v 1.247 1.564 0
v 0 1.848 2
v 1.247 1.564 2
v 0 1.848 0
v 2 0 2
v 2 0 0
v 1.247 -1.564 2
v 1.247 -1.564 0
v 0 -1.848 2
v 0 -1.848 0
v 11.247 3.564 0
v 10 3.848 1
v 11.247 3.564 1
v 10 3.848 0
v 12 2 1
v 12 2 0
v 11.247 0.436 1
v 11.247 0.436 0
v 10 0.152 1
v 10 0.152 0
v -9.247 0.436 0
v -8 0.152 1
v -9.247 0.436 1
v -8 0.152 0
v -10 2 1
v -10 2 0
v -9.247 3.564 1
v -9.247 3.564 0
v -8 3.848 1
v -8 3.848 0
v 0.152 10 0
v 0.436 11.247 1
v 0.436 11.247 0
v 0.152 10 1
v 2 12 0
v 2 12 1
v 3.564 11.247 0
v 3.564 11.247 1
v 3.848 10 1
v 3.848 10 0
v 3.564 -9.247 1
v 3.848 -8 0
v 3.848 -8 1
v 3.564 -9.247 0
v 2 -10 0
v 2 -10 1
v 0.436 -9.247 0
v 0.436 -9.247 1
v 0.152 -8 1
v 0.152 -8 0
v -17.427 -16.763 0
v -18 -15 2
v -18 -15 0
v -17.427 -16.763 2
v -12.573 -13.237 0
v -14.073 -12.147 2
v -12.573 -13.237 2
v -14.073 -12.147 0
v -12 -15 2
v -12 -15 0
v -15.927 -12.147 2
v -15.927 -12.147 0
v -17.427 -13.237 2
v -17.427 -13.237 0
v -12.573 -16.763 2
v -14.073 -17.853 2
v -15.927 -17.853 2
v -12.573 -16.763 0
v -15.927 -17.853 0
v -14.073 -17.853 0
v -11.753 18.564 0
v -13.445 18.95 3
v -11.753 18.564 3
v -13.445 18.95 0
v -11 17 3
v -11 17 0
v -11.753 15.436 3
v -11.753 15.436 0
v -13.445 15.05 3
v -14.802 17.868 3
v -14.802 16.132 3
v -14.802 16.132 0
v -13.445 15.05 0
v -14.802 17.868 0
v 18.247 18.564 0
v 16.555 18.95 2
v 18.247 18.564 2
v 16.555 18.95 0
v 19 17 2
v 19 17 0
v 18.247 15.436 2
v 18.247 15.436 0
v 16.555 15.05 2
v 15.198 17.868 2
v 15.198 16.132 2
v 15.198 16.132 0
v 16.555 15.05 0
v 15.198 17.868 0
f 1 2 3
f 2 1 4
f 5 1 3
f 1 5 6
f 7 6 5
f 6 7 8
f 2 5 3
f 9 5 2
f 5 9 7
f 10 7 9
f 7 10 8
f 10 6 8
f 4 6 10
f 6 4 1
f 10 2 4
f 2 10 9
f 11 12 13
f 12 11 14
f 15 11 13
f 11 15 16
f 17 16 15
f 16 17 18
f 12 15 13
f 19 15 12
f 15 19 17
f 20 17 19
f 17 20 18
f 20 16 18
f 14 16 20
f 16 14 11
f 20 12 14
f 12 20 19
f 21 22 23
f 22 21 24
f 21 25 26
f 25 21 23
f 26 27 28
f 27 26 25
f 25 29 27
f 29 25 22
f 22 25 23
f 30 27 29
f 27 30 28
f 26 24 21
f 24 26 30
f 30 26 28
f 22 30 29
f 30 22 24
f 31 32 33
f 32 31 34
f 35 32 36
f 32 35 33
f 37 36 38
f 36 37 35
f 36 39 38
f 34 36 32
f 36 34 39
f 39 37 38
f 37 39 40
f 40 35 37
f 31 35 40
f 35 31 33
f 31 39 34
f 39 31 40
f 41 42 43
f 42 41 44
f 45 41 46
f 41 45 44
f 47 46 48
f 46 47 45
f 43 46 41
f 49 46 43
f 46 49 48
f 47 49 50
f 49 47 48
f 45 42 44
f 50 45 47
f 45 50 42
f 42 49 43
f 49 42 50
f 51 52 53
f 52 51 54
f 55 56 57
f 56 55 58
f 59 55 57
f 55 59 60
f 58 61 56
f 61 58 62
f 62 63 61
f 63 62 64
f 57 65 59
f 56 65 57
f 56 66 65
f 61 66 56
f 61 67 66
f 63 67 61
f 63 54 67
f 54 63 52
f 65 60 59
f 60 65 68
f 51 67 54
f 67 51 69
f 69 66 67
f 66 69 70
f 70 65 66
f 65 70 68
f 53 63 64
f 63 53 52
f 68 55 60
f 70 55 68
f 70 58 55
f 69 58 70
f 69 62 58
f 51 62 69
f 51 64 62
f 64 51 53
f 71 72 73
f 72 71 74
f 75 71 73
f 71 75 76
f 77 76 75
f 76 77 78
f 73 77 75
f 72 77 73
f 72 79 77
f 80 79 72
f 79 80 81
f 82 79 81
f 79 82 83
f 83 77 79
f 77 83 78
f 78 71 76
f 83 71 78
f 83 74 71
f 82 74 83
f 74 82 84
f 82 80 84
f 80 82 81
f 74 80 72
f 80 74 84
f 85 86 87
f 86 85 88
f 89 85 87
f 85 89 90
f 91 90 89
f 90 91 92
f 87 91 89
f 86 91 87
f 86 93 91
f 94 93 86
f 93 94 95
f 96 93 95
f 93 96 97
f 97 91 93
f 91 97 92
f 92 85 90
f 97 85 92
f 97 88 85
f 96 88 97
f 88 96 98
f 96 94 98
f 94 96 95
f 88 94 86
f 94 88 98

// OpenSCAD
// file: myCube.scad
// Copyright Stephen Morrisson 2018
// All rights reserved

module myCube(c, xO, yO, zO, xS, yS, zS)
{
    color(c)
    translate([xO, yO, zO])
    cube([xS, yS, zS]);
}



// {xyz, rot, trans, tr} Cube

module xyzCube(c, x, y, z)
{
    color(c) cube([x, y, z], false);
}

module rotCube(c, rotX, rotY, rotZ, x, y, z)
{
    rotate([rotX, rotY, rotZ]) xyzCube(c, x, y, z);
}
translate([-15, 15, 0,])rotCube("green", 45, 45, 45, 2,2,2);

module transCube(c, xOffset, yOffset, zOffset, x, y, z)
{
    translate([xOffset, yOffset, zOffset]) xyzCube(c, x, y, z);
}
transCube("brown", -15, -15, 0, 3, 2, 1);


module trCube(c, rotX, rotY, rotZ, xO, yO, zO, x, y, z)
{
    translate([xO, yO, zO])
    rotate([rotX, rotY, rotZ])
    xyzCube(c, x, y, z);
}
//trCube("yellow", 0,0,0, 0,0,0, 2, 3, 4);
//trCube("green", 45, 45, 45, 4, 3, 1, 5, 6, 7);
//trCube("blue", 0, 0, 45, 20, 0, 0, 5, 6, 7);
trCube("orange", 0,0,0, -10, 0, 0, 1,1,1);
//trCube("orange", 45,0,0, -15, 0, 0, 1,1,1);
//trCube("orange", 0,45,0, -20, 0, 0, 1,1,1);
//trCube("orange", 0,0,45, -25, 0, 0, 1,1,1);
// main file
// Copyright Stephen Morrisson 2017
// All rights reserved

// rh Cent Cylinder
// rh Cylinder
use <myCube.scad>

module rhCentCylinder(c, rRadius, z)
{
    color(c) cylinder(h=z, r=rRadius, center=false);
}
translate([-15, -15, 0]) rhCentCylinder("red", 3, 2);

module rhCylinder(c, rRadius, z)
{
    translate([rRadius, rRadius, 0]) rhCentCylinder(c, rRadius, z);
}
translate([-15, 15, 0]) rhCylinder("blue", 2, 3);

module transCylinder(c, xO, yO, zO, rRadius, z)
{
    translate([xO, yO, zO]) rhCylinder(c, rRadius, z);
}
//transCylinder("red", 0,0,0, 4, 1);
transCylinder("green", 15, 15, 0, 2, 2);

module centRightCylinder(c, rRadius, z)
{
    rD = rRadius * 3.0;
    difference()
    {
        rhCentCylinder(c, rRadius, z);
        transCube(c, -rD, -rRadius, -rRadius,  rD, rD, rD);
    }
}
centRightCylinder("green", 2, 2);

module rightHalfCylinder(c, xO, yO, zO, rRadius, z)
{
    translate([xO, yO + rRadius, zO]) centRightCylinder(c, rRadius, z);
}
rightHalfCylinder("yellow", 10, 0, 0, 2, 1);

module leftHalfCylinder(c, xO, yO, zO, rRadius, z)
{
    translate([xO + rRadius, yO + rRadius, zO])
        rotate([0,0,180]) centRightCylinder(c, rRadius, z);
}
leftHalfCylinder("yellow", -10, 0, 0, 2, 1);

module topHalfCylinder(c, xO, yO, zO, rRadius, z)
{
    translate([xO + rRadius, yO, zO])
        rotate([0,0,90]) centRightCylinder(c, rRadius, z);
}
topHalfCylinder("yellow", 0, 10, 0, 2, 1);

module bottomHalfCylinder(c, xO, yO, zO, rRadius, z)
{
    translate([xO + rRadius, yO + rRadius, zO])
        rotate([0,0,270]) centRightCylinder(c, rRadius, z);
}
bottomHalfCylinder("yellow", 0, -10, 0, 2, 1);
